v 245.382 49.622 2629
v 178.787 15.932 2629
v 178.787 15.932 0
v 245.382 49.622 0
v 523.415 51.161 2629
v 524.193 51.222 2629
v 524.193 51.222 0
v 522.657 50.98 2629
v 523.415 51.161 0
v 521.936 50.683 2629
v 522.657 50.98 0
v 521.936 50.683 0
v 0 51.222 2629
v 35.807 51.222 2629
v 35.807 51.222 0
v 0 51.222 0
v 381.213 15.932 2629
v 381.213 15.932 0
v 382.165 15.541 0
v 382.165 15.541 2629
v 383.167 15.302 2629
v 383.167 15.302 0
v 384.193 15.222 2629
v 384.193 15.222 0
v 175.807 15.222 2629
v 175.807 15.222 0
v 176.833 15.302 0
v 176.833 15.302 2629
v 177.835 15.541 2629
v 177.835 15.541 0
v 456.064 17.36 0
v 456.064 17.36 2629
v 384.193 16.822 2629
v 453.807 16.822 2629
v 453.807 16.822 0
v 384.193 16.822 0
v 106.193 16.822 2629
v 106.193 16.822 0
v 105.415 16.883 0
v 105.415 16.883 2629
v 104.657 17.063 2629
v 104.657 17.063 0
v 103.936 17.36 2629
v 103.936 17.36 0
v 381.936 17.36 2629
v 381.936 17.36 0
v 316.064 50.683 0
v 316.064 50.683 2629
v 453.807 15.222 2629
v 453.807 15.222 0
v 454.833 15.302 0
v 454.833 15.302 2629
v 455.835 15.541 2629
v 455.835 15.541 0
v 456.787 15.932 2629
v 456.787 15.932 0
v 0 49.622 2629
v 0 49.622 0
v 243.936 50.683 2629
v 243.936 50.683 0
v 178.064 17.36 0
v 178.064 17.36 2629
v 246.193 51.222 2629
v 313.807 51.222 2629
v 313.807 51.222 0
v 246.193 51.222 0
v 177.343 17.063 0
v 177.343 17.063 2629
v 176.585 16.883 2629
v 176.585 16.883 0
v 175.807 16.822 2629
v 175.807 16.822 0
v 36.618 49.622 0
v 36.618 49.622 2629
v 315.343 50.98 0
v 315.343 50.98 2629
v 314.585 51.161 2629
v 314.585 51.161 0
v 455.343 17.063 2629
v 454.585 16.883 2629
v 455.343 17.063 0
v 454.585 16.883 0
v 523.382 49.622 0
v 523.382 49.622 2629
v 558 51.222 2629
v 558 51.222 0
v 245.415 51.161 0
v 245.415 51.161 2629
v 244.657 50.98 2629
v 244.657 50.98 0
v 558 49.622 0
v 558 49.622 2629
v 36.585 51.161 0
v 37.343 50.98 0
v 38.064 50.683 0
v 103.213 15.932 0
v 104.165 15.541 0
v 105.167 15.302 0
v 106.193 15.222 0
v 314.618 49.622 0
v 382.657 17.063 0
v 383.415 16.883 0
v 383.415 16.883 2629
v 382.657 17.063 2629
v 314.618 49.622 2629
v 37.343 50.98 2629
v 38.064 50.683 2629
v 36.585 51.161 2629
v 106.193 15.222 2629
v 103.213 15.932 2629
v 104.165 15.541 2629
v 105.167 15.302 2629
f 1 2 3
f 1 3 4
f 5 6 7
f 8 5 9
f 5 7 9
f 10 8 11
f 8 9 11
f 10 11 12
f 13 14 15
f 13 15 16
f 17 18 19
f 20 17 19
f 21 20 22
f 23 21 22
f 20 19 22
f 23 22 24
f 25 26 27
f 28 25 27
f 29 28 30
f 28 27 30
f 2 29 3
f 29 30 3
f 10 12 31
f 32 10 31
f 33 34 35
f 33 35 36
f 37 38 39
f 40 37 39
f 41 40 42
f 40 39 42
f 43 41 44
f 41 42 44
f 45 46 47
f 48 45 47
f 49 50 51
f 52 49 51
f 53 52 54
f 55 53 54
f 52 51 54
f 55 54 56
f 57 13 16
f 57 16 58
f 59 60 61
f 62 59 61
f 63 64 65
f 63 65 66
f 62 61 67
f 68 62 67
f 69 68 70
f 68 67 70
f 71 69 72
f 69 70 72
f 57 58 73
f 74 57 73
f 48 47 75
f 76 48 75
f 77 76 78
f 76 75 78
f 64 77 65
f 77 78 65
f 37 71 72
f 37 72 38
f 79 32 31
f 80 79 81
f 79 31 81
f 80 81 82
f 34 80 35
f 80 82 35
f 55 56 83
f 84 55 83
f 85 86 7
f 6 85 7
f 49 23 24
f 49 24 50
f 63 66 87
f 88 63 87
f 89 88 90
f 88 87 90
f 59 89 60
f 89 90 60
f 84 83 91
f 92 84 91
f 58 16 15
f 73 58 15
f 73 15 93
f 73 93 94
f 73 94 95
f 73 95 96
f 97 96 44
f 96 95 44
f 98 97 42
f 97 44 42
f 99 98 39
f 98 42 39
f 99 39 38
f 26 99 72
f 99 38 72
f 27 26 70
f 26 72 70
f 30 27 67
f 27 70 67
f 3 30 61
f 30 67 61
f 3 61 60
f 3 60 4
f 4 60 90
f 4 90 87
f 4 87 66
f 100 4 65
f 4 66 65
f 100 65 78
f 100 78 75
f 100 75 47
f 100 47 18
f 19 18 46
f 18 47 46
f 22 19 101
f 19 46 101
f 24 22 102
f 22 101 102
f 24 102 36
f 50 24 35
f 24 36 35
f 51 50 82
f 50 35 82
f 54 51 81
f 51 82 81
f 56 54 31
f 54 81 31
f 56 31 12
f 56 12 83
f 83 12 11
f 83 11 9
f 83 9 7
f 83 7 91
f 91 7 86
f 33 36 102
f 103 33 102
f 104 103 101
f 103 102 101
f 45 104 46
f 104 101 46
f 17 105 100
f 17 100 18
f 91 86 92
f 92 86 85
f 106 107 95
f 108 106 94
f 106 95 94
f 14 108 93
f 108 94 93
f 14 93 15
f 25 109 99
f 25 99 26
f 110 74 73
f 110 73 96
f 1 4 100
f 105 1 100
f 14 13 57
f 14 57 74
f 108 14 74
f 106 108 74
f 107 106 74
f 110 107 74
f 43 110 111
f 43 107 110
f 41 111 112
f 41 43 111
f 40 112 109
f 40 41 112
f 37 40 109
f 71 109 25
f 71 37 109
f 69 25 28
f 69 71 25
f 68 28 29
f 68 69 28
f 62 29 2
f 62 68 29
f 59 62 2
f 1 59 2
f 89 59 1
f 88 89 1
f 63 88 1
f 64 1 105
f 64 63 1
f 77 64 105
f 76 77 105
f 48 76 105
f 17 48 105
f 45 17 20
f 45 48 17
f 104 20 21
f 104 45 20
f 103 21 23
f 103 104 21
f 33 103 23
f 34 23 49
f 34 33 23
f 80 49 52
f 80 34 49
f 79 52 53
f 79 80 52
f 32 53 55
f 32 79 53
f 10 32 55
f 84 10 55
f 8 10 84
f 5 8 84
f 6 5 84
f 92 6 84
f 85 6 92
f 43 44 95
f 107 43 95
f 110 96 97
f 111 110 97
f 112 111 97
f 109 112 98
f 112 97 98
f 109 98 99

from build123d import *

# Parameters (mm, degrees)
F1_DEPTH = 2629
F2_W     = 721.211998
F2_H     = 2677.757788
F3_DEPTH = 36.001


with BuildPart() as f1:
    # F0 (on Top) → F1 (new body)
    with BuildSketch(Plane.XY):
        with BuildLine():
            ThreePointArc((103.213446, 15.932448), (104.661294, 15.401879), (106.192738, 15.221745))
            Line((106.192738, 15.221745), (175.807262, 15.221745))
            ThreePointArc((175.807262, 15.221745), (177.338706, 15.401879), (178.786554, 15.932448))
            Line((178.786554, 15.932448), (245.381676, 49.621745))
            Line((245.381676, 49.621745), (314.618324, 49.621745))
            Line((314.618324, 49.621745), (381.213446, 15.932448))
            ThreePointArc((381.213446, 15.932448), (382.661294, 15.401879), (384.192738, 15.221745))
            Line((384.192738, 15.221745), (453.807262, 15.221745))
            ThreePointArc((453.807262, 15.221745), (455.338706, 15.401879), (456.786554, 15.932448))
            Line((456.786554, 15.932448), (523.381676, 49.621745))
            Line((523.381676, 49.621745), (592.618324, 49.621745))
            Line((592.618324, 49.621745), (659.213446, 15.932448))
            ThreePointArc((659.213446, 15.932448), (660.661294, 15.401879), (662.192738, 15.221745))
            Line((662.192738, 15.221745), (731.807262, 15.221745))
            ThreePointArc((731.807262, 15.221745), (733.338706, 15.401879), (734.786554, 15.932448))
            Line((734.786554, 15.932448), (801.381676, 49.621745))
            Line((801.381676, 49.621745), (870.618324, 49.621745))
            Line((870.618324, 49.621745), (937.213446, 15.932448))
            ThreePointArc((937.213446, 15.932448), (938.661294, 15.401879), (940.192738, 15.221745))
            Line((940.192738, 15.221745), (1009.807262, 15.221745))
            ThreePointArc((1009.807262, 15.221745), (1011.338706, 15.401879), (1012.786554, 15.932448))
            Line((1012.786554, 15.932448), (1079.381676, 49.621745))
            Line((1079.381676, 49.621745), (1116, 49.621745))
            Line((1116, 49.621745), (1116, 51.221745))
            Line((1116, 51.221745), (1080.192738, 51.221745))
            ThreePointArc((1080.192738, 51.221745), (1079.032553, 51.08528), (1077.935699, 50.683334))
            Line((1077.935699, 50.683334), (1012.064301, 17.360156))
            ThreePointArc((1012.064301, 17.360156), (1010.967447, 16.95821), (1009.807262, 16.821745))
            Line((1009.807262, 16.821745), (940.192738, 16.821745))
            ThreePointArc((940.192738, 16.821745), (939.032553, 16.95821), (937.935699, 17.360156))
            Line((937.935699, 17.360156), (872.064301, 50.683334))
            ThreePointArc((872.064301, 50.683334), (870.967447, 51.08528), (869.807262, 51.221745))
            Line((869.807262, 51.221745), (802.192738, 51.221745))
            ThreePointArc((802.192738, 51.221745), (801.032553, 51.08528), (799.935699, 50.683334))
            Line((799.935699, 50.683334), (734.064301, 17.360156))
            ThreePointArc((734.064301, 17.360156), (732.967447, 16.95821), (731.807262, 16.821745))
            Line((731.807262, 16.821745), (662.192738, 16.821745))
            ThreePointArc((662.192738, 16.821745), (661.032553, 16.95821), (659.935699, 17.360156))
            Line((659.935699, 17.360156), (594.064301, 50.683334))
            ThreePointArc((594.064301, 50.683334), (592.967447, 51.08528), (591.807262, 51.221745))
            Line((591.807262, 51.221745), (524.192738, 51.221745))
            ThreePointArc((524.192738, 51.221745), (523.032553, 51.08528), (521.935699, 50.683334))
            Line((521.935699, 50.683334), (456.064301, 17.360156))
            ThreePointArc((456.064301, 17.360156), (454.967447, 16.95821), (453.807262, 16.821745))
            Line((453.807262, 16.821745), (384.192738, 16.821745))
            ThreePointArc((384.192738, 16.821745), (383.032553, 16.95821), (381.935699, 17.360156))
            Line((381.935699, 17.360156), (316.064301, 50.683334))
            ThreePointArc((316.064301, 50.683334), (314.967447, 51.08528), (313.807262, 51.221745))
            Line((313.807262, 51.221745), (246.192738, 51.221745))
            ThreePointArc((246.192738, 51.221745), (245.032553, 51.08528), (243.935699, 50.683334))
            Line((243.935699, 50.683334), (178.064301, 17.360156))
            ThreePointArc((178.064301, 17.360156), (176.967447, 16.95821), (175.807262, 16.821745))
            Line((175.807262, 16.821745), (106.192738, 16.821745))
            ThreePointArc((106.192738, 16.821745), (105.032553, 16.95821), (103.935699, 17.360156))
            Line((103.935699, 17.360156), (38.064301, 50.683334))
            ThreePointArc((38.064301, 50.683334), (36.967447, 51.08528), (35.807262, 51.221745))
            Line((35.807262, 51.221745), (0, 51.221745))
            Line((0, 51.221745), (0, 49.621745))
            Line((0, 49.621745), (36.618324, 49.621745))
            Line((36.618324, 49.621745), (103.213446, 15.932448))
        make_face()
    extrude(amount=F1_DEPTH)

    # F2 (on face) → F3 (cut, through all)
    with BuildSketch(Plane(origin=(0, 51.221745, 0), x_dir=(-1, 0, 0), z_dir=(0, 1, 0))):
        with Locations((-918.605999, 1290.121106)):
            Rectangle(F2_W, F2_H)
    extrude(amount=-F3_DEPTH, mode=Mode.SUBTRACT)


solid = f1.part
